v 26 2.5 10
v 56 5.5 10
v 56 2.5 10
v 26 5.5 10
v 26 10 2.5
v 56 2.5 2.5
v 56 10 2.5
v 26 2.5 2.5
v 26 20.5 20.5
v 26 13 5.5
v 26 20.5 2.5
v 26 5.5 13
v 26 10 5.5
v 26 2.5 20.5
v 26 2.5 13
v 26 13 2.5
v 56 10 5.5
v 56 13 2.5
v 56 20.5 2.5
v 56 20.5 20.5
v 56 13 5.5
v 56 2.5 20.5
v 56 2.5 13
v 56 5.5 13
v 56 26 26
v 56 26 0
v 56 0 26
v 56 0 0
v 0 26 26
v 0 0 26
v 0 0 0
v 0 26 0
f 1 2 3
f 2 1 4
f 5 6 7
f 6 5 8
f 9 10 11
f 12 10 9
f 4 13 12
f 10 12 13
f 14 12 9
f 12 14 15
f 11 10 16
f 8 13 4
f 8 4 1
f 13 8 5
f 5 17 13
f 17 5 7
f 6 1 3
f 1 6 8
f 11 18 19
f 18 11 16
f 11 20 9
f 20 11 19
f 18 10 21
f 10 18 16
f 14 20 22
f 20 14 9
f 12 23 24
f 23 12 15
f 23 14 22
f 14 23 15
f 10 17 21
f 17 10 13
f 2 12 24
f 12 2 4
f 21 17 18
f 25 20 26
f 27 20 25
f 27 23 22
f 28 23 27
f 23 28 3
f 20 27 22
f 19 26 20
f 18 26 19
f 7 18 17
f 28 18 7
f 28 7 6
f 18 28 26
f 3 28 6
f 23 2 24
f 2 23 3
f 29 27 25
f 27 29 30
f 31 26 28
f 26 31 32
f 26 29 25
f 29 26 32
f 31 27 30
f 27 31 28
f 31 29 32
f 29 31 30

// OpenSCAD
/* [Tips] */
// Length of the tips
tipsL = 30.0;  // [1,2,3,4,5,6,7,8,9,30]
// Width of the tips
tipsW = 26.0;

/* [Profiles] */
// Width of the profiles
profilesW = 21.0;

/* [Blocs] */
// Length of the blocs
blocsL = 6;
// Width of the blocs
blocsW = 3;

/* [Hidden] */
// Thickness of the arms
// tipsT = (tipsW-profilesW)/2;

// to avoid "z fighting" where surfaces line up exactly, add a bit of fudge
fudge = 1;

module void_profile(
    length,         // Length of the profile
    width = 20,     // Width of the profile
    blocL = 6,      // Lenght of the bloc
    blocW = 3)      // Width of the bloc
{
    step = (width - blocL)/2;

    // Bottom-left hole
    translate([0,0,0])             
    cube([length,step,step]);
    
    // Bottom-rigth hole
    translate([0,step+blocW,0])    
    cube([length,step,step]);
    
    // Top-left hole
    translate([0,0,step+blocW])
    cube([length,step,step]);
    
    // Top-rigth hole
    translate([0,step+blocW,step+blocW])
    cube([length,step,step]);
    
    // Middle hole
    translate([0,blocW,blocW])
    cube([length,width-2*blocW,width-2*blocW]);
}

module tip_profile(
    tipL,           // Length of the tip
    tipW,           // Width of the tip
    profileW,       // Width of the profile
    blocL,          // Length of the bloc
    blocW,          // Width of the bloc
    fudge=1)        // 
{
    difference()
    {
        // The tip
        color("blue")
        cube([tipL, tipW, tipW]);
        
        color("red")
        translate([0, (tipW-profileW)/2, (tipW-profileW)/2])
        void_profile(tipL+fudge, profileW, blocL, blocW);
    }
}

union()
{
    color("green")
    cube(tipsW);

    translate([tipsW, 0, 0])
    tip_profile(tipsL, tipsW, profilesW, blocsL, blocsW, fudge);
}
